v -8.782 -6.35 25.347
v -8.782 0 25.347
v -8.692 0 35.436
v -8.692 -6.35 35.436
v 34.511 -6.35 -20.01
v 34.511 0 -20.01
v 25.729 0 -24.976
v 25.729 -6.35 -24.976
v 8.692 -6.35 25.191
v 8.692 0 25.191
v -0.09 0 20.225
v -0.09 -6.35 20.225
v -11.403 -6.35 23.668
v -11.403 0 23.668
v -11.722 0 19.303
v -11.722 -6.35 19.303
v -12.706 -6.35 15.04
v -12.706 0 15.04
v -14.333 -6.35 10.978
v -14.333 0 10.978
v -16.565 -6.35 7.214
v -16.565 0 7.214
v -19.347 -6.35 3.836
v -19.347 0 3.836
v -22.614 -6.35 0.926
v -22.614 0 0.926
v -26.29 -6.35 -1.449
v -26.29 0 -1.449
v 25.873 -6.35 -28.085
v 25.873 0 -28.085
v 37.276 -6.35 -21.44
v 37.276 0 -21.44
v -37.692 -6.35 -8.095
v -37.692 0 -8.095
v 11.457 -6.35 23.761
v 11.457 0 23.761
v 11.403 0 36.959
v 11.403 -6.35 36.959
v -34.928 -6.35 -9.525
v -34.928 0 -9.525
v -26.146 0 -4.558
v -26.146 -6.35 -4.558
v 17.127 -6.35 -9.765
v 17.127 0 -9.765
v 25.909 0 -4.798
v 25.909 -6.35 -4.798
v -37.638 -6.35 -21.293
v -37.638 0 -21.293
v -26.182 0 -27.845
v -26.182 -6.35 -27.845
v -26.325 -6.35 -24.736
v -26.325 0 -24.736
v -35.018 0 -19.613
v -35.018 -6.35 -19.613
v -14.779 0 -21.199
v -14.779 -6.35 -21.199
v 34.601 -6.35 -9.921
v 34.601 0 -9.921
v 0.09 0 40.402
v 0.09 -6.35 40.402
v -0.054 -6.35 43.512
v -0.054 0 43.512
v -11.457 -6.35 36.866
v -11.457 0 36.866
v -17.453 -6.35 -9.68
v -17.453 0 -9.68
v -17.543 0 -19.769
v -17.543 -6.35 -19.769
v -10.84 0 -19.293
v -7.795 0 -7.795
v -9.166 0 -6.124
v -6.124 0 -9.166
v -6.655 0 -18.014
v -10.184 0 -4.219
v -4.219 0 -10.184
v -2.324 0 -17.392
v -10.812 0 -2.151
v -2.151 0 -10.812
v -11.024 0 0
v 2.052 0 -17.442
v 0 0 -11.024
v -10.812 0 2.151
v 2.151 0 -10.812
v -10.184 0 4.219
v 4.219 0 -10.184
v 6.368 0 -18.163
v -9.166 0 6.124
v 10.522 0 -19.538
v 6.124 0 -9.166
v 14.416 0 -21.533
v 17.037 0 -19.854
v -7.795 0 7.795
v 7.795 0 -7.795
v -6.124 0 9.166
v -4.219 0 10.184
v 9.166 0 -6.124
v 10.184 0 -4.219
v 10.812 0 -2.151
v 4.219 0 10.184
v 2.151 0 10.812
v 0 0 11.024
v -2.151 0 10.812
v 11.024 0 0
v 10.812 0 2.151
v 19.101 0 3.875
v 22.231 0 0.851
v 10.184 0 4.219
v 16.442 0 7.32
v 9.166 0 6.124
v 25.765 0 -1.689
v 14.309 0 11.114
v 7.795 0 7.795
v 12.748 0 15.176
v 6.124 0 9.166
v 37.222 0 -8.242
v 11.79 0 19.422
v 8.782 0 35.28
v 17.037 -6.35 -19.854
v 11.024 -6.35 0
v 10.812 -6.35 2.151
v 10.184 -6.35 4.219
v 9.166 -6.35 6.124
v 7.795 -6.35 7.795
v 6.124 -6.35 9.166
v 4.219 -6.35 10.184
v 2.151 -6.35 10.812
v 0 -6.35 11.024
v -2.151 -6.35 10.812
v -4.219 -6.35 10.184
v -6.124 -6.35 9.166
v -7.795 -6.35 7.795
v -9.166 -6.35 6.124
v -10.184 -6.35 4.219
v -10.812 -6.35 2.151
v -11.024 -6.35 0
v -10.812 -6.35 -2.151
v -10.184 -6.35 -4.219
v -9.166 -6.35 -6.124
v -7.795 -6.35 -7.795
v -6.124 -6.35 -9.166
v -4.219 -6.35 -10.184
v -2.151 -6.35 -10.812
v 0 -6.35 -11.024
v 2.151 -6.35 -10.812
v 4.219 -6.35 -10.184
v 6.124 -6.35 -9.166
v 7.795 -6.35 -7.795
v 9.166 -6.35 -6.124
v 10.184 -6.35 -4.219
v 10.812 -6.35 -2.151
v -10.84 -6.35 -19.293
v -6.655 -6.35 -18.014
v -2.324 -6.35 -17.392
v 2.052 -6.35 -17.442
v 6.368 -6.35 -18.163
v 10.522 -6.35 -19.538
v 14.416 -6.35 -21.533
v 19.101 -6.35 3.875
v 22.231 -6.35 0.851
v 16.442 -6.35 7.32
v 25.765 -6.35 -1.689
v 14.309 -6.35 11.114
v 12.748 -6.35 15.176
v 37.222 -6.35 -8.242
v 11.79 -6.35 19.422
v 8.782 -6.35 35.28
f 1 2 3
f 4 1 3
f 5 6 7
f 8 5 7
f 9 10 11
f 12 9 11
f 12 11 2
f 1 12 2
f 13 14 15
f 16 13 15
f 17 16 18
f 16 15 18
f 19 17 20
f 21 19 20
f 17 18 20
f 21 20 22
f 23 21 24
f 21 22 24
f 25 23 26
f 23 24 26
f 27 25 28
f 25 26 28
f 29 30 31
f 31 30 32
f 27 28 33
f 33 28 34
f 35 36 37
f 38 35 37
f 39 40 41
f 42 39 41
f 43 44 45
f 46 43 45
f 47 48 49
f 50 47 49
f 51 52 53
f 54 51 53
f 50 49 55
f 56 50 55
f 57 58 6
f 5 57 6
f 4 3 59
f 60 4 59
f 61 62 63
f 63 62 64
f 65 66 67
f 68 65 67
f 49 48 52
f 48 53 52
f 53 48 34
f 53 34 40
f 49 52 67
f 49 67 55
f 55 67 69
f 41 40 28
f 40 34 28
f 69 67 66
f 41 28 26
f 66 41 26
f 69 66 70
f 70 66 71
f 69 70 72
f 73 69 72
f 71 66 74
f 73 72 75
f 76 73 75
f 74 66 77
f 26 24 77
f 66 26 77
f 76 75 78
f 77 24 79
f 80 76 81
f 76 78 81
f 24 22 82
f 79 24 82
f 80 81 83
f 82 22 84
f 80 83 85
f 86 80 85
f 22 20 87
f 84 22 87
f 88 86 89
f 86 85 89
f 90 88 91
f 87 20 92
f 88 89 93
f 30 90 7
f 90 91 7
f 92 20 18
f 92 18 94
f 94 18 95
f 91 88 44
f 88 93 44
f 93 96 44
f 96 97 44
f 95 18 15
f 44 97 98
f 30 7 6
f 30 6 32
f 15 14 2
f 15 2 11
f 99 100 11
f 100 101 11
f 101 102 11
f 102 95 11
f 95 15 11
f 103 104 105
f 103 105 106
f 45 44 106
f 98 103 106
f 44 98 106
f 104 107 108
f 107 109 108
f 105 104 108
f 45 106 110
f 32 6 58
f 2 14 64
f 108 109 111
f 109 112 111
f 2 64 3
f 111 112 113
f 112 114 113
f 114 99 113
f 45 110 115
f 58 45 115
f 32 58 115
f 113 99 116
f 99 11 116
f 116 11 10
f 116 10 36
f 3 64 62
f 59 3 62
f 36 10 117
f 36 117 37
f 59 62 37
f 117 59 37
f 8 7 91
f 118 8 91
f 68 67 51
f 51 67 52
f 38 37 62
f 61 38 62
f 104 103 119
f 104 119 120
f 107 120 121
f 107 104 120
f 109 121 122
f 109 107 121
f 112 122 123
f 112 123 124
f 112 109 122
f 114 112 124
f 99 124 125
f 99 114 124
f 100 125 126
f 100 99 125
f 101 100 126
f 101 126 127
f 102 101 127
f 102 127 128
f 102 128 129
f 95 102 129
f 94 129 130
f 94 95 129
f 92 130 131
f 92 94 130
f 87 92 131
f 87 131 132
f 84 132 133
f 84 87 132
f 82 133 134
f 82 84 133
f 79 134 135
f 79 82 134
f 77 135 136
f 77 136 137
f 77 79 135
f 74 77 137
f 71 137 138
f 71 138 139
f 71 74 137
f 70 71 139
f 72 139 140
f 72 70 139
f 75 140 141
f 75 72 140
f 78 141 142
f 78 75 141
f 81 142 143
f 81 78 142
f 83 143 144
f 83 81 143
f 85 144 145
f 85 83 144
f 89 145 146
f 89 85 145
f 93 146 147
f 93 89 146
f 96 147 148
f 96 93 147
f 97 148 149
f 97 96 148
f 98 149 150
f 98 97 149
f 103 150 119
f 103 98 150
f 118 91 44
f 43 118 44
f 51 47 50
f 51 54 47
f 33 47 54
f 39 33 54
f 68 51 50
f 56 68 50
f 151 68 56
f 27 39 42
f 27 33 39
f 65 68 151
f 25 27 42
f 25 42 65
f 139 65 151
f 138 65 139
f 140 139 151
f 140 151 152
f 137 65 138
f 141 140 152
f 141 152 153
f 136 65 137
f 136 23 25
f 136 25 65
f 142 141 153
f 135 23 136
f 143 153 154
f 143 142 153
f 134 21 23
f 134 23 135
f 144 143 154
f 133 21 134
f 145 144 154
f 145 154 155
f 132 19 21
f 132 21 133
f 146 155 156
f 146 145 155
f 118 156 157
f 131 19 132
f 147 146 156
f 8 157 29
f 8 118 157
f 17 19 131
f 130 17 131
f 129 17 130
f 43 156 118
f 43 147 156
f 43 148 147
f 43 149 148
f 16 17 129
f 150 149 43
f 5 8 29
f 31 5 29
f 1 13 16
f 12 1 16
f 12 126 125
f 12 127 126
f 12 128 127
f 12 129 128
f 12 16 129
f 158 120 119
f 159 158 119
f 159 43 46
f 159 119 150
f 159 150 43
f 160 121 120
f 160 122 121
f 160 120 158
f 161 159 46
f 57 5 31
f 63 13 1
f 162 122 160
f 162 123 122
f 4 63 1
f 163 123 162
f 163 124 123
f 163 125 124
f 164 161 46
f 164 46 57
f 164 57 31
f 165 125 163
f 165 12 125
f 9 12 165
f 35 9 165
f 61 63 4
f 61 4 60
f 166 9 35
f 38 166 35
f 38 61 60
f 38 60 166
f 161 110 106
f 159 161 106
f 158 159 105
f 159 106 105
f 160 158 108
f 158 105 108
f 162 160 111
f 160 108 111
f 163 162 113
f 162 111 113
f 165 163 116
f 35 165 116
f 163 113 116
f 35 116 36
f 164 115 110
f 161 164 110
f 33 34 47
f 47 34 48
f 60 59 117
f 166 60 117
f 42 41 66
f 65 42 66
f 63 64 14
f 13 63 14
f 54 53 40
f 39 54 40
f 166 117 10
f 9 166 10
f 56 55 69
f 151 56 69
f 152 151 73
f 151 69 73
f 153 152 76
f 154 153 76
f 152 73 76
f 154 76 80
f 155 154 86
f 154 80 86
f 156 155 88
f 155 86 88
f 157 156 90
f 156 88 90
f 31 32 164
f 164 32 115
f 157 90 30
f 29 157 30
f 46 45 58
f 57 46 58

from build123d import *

# Parameters (mm, degrees)
F0_R     = 14.2875
F0_R_2   = 11.0236
F1_DEPTH = 6.35


# Not quite as in the source:
# - a feature names something its author has since deleted; it is built from what else it names


with BuildPart() as f1:
    # F0 (on Front) → F1 (new body)
    with BuildSketch(Plane.XZ):
        with BuildLine():
            ThreePointArc((25.7649177957, -1.6892582355), (15.3069411381, 9.1784817197), (11.4569144183, 23.7611543748))
            Line((11.4569144183, 23.7611543748), (0.05402032, 17.115313105))
            Line((0.05402032, 17.115313105), (-11.4028940983, 23.6675884359))
            ThreePointArc((-11.4028940983, 23.6675884359), (-15.3765179084, 9.0528933251), (-26.2895962669, -1.4487122715))
            Line((-26.2895962669, -1.4487122715), (-14.8326818486, -8.0009876024))
            Line((-14.8326818486, -8.0009876024), (-14.7786615286, -21.1991042031))
            ThreePointArc((-14.7786615286, -21.1991042031), (-0.135152389, -17.3330158123), (14.4160440174, -21.533216106))
            Line((14.4160440174, -21.533216106), (14.3620236974, -8.3350995053))
            Line((14.3620236974, -8.3350995053), (25.7649177957, -1.6892582355))
        make_face()
        Circle(F0_R, mode=Mode.SUBTRACT)
        Circle(F0_R)
        Circle(F0_R_2, mode=Mode.SUBTRACT)
        Polygon((11.4028940983, 36.9592709755), (-0.05402032, 43.5115463064), (-11.4569144183, 36.8657050366), (-11.4028940983, 23.6675884359), (0.05402032, 17.115313105), (11.4569144183, 23.7611543748), align=None)
        Polygon((-8.6923295278, 35.4356960394), (0.089848006, 40.4023410617), (8.7821775338, 35.280074728), (8.6923295278, 25.191163372), (-0.089848006, 20.2245183497), (-8.7821775338, 25.3467846834), align=None, mode=Mode.SUBTRACT)
        Polygon((37.221832214, -8.2415335664), (25.7649177957, -1.6892582355), (14.3620236974, -8.3350995053), (14.4160440174, -21.533216106), (25.8729584357, -28.0854914369), (37.275852534, -21.4396501671), align=None)
        Polygon((17.1266085879, -9.7651085025), (25.9087861217, -4.7984634802), (34.6011156495, -9.9207298139), (34.5112676435, -20.0096411699), (25.7290901097, -24.9762861922), (17.0367605819, -19.8540198585), align=None, mode=Mode.SUBTRACT)
        Polygon((-14.8326818486, -8.0009876024), (-26.2895962669, -1.4487122715), (-37.6924903652, -8.0945535413), (-37.6384700452, -21.292670142), (-26.1815556269, -27.8449454729), (-14.7786615286, -21.1991042031), align=None)
        Polygon((-17.4533984131, -9.6801838499), (-17.5432464191, -19.7690952059), (-26.325423953, -24.7357402282), (-35.0177534808, -19.6134738945), (-34.9279054747, -9.5245625385), (-26.1457279409, -4.5579175162), align=None, mode=Mode.SUBTRACT)
    extrude(amount=F1_DEPTH)


solid = f1.part
